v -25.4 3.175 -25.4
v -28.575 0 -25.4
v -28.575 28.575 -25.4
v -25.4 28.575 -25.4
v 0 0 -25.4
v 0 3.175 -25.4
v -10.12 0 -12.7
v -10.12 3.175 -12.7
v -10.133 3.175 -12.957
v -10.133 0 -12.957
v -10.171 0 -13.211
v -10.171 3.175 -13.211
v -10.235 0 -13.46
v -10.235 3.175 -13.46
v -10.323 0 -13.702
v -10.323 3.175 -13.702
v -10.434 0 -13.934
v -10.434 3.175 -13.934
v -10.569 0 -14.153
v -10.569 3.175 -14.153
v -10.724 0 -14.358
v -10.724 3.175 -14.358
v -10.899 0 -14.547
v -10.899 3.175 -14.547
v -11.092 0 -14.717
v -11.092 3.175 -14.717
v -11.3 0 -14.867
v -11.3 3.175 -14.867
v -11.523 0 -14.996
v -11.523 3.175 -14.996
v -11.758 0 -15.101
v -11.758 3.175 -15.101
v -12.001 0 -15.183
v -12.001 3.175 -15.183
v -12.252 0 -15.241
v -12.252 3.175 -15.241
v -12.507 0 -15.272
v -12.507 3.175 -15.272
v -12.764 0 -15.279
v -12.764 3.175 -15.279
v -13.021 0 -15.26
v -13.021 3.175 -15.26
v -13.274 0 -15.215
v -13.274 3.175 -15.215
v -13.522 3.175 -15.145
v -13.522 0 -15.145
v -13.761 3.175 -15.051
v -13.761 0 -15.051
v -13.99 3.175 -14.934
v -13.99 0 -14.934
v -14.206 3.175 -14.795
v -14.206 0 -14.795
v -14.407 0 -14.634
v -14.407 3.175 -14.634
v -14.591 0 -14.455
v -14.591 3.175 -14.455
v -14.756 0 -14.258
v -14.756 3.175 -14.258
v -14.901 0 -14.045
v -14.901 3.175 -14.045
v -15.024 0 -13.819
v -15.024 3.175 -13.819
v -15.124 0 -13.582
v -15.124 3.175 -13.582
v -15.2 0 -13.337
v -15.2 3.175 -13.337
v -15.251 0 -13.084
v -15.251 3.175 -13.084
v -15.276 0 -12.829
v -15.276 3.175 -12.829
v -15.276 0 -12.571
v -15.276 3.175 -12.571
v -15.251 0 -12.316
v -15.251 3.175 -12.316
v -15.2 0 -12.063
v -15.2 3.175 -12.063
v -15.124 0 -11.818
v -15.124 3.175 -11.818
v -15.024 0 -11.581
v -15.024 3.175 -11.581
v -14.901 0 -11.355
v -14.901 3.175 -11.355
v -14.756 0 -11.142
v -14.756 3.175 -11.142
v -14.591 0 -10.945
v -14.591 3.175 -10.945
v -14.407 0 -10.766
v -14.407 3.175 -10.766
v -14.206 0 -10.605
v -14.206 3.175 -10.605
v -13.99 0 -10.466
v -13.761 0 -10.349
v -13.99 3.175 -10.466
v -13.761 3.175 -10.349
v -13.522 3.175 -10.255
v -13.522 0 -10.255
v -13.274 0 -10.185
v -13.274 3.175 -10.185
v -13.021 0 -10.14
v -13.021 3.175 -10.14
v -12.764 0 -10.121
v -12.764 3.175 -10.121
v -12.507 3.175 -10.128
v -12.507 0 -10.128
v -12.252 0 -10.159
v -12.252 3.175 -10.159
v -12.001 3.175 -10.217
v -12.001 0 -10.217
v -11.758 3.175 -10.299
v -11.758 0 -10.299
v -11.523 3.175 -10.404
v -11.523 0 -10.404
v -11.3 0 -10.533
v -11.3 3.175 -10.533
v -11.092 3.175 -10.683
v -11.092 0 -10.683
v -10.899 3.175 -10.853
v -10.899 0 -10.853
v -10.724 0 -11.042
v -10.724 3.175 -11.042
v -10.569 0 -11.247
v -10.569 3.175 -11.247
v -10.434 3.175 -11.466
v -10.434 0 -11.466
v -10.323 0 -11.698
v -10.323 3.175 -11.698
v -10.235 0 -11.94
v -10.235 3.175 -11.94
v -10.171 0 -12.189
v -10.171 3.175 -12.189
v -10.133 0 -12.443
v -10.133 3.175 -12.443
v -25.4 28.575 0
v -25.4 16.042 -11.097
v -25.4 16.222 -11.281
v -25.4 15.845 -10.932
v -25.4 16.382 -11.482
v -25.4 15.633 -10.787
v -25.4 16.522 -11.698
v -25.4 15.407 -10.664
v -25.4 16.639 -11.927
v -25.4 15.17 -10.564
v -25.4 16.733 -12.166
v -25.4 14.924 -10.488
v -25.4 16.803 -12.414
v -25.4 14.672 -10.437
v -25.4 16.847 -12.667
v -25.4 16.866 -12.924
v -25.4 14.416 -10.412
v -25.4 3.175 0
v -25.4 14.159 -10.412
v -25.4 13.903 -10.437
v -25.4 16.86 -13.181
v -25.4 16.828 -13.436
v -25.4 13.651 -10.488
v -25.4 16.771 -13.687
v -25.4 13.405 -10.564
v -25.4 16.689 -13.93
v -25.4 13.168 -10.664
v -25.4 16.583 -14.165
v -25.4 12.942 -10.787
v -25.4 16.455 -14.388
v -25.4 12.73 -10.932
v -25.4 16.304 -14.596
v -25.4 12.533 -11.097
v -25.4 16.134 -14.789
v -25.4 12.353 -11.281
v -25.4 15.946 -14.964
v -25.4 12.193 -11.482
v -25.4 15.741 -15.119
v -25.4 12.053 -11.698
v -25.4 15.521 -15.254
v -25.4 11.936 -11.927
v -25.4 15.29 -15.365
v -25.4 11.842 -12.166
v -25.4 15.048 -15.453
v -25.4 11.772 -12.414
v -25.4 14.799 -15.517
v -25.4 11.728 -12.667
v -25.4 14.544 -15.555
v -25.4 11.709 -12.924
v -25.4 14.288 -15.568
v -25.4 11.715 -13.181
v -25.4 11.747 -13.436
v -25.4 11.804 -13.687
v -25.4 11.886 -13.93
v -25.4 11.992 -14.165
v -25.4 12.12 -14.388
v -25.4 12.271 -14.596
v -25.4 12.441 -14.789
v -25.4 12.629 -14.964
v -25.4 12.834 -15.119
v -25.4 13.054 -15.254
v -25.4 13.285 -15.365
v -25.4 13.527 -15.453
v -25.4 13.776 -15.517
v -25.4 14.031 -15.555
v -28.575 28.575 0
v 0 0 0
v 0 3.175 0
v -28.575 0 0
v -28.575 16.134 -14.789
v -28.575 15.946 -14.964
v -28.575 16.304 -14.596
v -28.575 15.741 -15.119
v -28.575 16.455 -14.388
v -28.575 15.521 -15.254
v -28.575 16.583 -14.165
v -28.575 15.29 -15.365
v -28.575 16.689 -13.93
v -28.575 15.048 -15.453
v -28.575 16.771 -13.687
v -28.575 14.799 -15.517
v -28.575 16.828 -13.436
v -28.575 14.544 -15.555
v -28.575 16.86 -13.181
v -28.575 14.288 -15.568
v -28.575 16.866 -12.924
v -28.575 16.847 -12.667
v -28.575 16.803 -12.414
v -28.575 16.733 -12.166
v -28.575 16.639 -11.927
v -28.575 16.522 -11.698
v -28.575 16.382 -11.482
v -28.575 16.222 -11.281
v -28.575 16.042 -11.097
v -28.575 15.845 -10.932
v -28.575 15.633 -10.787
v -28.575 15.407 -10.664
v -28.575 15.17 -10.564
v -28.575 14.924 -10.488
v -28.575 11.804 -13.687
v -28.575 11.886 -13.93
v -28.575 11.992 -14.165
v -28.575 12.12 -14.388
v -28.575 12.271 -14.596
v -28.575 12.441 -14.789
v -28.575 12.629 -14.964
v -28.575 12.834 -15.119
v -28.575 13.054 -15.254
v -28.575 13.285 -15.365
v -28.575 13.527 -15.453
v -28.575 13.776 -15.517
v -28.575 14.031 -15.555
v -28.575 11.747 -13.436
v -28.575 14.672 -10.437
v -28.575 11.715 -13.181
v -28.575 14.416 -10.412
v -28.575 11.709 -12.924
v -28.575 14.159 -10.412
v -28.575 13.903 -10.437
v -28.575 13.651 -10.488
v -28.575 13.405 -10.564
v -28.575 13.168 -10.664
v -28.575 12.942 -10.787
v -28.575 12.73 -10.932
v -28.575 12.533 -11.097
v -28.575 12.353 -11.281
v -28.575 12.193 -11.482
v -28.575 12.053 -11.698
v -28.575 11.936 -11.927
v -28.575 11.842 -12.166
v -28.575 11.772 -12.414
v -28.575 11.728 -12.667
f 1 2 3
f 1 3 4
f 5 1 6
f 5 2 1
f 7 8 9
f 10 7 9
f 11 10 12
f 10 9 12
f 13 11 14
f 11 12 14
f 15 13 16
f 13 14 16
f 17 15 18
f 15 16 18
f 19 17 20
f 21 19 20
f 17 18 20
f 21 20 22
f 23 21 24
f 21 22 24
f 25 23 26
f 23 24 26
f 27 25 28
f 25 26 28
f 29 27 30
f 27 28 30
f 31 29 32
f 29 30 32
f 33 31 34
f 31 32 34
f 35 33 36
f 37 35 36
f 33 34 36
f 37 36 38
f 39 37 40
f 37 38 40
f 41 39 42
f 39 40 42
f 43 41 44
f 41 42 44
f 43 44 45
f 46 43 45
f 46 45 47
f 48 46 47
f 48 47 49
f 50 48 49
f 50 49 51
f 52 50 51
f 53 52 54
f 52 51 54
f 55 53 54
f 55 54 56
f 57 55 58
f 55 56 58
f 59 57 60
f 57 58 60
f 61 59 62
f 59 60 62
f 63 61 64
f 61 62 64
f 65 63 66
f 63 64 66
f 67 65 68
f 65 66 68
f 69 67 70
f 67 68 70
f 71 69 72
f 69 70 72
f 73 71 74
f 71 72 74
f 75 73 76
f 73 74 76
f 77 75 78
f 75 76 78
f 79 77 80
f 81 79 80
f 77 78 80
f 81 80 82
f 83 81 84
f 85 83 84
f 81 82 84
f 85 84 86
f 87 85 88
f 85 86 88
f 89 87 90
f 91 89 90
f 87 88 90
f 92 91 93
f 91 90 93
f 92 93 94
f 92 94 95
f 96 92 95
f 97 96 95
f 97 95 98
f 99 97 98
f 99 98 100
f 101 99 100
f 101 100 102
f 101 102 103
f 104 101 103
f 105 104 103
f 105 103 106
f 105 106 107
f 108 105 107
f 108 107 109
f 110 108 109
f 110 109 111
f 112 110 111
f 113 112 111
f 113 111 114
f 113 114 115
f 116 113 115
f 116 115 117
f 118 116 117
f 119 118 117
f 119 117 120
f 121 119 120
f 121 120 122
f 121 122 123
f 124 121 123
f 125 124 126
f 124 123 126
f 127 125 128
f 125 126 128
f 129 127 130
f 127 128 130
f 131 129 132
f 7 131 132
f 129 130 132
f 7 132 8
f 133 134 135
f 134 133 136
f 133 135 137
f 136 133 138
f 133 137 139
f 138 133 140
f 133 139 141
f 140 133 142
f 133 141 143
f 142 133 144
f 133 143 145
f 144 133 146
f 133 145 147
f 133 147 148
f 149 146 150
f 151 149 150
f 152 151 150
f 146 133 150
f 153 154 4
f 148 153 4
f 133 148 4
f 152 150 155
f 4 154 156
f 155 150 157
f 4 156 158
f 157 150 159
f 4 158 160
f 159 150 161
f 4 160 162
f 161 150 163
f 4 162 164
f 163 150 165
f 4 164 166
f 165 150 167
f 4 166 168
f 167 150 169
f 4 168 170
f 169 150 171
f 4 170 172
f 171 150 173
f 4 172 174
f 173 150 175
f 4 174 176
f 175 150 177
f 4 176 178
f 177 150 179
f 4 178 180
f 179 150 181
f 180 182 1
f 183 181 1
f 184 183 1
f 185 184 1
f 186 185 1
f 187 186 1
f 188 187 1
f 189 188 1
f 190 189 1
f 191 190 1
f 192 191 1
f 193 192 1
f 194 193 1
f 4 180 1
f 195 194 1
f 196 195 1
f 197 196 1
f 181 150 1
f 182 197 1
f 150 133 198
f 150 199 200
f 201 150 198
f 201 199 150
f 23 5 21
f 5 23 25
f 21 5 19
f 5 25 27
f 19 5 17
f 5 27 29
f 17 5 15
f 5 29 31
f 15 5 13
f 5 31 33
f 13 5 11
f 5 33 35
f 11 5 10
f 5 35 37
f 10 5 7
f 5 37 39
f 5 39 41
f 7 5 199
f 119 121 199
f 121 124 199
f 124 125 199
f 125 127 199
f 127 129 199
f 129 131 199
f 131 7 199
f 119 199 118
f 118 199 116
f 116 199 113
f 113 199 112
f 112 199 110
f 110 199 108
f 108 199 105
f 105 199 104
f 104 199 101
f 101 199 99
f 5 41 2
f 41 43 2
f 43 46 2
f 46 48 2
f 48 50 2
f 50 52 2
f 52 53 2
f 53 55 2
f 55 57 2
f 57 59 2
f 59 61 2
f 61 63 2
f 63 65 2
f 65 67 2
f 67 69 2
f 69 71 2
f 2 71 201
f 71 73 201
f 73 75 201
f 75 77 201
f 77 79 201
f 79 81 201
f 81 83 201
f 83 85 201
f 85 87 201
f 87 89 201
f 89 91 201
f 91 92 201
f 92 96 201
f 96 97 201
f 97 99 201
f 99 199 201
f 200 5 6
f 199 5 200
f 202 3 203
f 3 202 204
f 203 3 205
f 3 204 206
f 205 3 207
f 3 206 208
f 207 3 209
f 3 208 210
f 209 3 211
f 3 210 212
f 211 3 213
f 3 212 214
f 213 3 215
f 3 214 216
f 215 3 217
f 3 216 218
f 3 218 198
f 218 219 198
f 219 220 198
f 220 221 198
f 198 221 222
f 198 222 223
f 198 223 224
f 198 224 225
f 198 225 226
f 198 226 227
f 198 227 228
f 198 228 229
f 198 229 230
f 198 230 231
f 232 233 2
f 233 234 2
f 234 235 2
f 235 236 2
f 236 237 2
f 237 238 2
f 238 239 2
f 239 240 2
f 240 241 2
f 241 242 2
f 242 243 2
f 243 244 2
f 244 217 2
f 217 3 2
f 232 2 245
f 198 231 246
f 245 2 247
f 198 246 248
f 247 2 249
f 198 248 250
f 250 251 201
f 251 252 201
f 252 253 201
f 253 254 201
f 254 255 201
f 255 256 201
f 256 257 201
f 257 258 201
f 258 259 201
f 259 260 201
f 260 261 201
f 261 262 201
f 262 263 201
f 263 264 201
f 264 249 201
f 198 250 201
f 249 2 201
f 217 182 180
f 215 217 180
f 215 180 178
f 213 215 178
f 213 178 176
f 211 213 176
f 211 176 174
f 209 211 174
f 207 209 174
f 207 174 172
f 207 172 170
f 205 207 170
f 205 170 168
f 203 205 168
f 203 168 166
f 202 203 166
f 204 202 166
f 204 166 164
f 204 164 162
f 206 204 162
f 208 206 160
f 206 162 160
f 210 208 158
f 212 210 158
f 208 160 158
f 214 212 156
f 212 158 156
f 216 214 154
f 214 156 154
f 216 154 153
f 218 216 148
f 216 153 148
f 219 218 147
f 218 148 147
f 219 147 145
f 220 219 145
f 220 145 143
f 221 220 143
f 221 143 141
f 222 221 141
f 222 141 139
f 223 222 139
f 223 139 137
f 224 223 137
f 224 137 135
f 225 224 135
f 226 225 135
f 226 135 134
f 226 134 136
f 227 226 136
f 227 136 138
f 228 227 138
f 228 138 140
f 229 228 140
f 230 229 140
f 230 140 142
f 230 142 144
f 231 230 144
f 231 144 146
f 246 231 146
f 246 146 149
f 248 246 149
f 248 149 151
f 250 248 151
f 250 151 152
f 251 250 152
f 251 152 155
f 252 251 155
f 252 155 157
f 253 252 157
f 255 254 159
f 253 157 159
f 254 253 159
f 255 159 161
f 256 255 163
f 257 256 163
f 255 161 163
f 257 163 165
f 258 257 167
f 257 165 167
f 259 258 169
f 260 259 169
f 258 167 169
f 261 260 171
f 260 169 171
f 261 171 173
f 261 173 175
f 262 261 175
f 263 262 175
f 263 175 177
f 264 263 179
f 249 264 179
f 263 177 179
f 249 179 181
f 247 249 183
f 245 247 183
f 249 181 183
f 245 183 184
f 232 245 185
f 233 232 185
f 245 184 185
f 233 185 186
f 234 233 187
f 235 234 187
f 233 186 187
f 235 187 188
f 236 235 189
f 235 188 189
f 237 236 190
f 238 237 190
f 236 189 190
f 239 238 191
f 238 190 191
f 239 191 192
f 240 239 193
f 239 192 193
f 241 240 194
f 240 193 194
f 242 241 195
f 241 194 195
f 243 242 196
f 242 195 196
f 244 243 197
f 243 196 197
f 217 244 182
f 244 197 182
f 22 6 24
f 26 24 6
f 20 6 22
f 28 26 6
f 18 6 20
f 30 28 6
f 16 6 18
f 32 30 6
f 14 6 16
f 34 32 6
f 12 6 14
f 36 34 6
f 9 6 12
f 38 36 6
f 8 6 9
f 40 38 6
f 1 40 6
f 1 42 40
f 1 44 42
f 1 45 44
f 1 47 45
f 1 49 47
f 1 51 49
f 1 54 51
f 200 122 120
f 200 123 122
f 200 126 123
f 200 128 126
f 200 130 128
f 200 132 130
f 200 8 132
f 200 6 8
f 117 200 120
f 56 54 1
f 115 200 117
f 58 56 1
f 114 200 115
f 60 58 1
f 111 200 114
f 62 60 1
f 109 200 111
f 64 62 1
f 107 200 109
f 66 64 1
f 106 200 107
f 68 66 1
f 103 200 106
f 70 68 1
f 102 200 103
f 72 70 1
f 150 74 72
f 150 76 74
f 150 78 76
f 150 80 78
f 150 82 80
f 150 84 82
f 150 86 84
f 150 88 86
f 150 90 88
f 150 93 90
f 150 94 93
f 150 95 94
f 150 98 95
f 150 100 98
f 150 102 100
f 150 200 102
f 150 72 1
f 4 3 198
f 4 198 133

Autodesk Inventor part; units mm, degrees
ref_plane "YZ Plane" through (0, 0, 0) normal (1, 0, 0) x (0, 1, 0)
ref_plane "XZ Plane" through (0, 0, 0) normal (0, 1, 0) x (-1, 0, 0)
ref_plane "XY Plane" through (0, 0, 0) normal (0, 0, 1) x (1, 0, 0)
sketch "Sketch1" plane through (0, 0, 0) normal (0, 1, 0) x (-1, 0, 0)
  line L0 (0, 0) -> (25.4, 0)
  line L1 (25.4, 0) -> (25.4, -25.4)
  line L2 (25.4, -25.4) -> (0, -25.4)
  line L3 (0, -25.4) -> (0, 0)
  dimension "d0" = 25.4
  dimension "d1" = 25.4
extrude "Extrusion1" add sketch "Sketch1" along normal blind 3.175
sketch "Sketch2" plane through (0, 0, 0) normal (0, 1, 0) x (1, 0, 0)
  line L0 (-25.4, 0) -> (0, 0) construction
  line L1 (-12.7, 0) -> (-12.7, 12.7) construction
  line L2 (0, 25.4) -> (-25.4, 25.4) construction
  line L3 (-12.7, 25.4) -> (-12.7, 12.7) construction
  line L4 (-25.4, 25.4) -> (-25.4, 0) construction
  line L5 (-25.4, 12.7) -> (0, 12.7) construction
  line L6 (-25.4, 25.4) -> (-28.575, 25.4)
  line L7 (-28.575, 25.4) -> (-28.575, 0)
  line L8 (-28.575, 0) -> (-25.4, 0)
  line L9 (-25.4, 0) -> (-25.4, 25.4)
  dimension "d4" = 12.7
  dimension "d5" = 12.7
  dimension "d6" = 3.175
extrude "Extrusion2" add sketch "Sketch2" along normal blind 28.575
sketch "Sketch3" plane through (0, 3.175, 0) normal (0, 1, 0) x (1, 0, 0)
  line L0 (0, 0) -> (0, 25.4) construction
  line L1 (0, 12.7) -> (-16.1864, 12.7) construction
  line L2 (0, 25.4) -> (-25.4, 25.4) construction
  line L3 (-12.7, 25.4) -> (-12.7, 5.173) construction
  circle A0 centre (-12.7, 12.7) radius 2.5797
  dimension "d9" = 5.1594
sketch "Sketch4" plane through (-25.4, 3.175, -25.4) normal (1, 0, 0) x (0, 0, -1)
  line L0 (0, 25.4) -> (-25.4, 25.4) construction
  line L1 (-12.7, 25.4) -> (-12.7, 8.5615) construction
  line L2 (-25.4, -3.175) -> (-25.4, 25.4) construction
  line L3 (-25.4, 11.1125) -> (0.5761, 11.1125) construction
  circle A0 centre (-12.412, 11.1125) radius 2.5797
  dimension "d10" = 5.1594
extrude "Extrusion3" cut sketch "Sketch4" against normal blind 28.575
extrude "Extrusion4" cut sketch "Sketch3" against normal blind 28.575
properties part number "spring extentsion"
